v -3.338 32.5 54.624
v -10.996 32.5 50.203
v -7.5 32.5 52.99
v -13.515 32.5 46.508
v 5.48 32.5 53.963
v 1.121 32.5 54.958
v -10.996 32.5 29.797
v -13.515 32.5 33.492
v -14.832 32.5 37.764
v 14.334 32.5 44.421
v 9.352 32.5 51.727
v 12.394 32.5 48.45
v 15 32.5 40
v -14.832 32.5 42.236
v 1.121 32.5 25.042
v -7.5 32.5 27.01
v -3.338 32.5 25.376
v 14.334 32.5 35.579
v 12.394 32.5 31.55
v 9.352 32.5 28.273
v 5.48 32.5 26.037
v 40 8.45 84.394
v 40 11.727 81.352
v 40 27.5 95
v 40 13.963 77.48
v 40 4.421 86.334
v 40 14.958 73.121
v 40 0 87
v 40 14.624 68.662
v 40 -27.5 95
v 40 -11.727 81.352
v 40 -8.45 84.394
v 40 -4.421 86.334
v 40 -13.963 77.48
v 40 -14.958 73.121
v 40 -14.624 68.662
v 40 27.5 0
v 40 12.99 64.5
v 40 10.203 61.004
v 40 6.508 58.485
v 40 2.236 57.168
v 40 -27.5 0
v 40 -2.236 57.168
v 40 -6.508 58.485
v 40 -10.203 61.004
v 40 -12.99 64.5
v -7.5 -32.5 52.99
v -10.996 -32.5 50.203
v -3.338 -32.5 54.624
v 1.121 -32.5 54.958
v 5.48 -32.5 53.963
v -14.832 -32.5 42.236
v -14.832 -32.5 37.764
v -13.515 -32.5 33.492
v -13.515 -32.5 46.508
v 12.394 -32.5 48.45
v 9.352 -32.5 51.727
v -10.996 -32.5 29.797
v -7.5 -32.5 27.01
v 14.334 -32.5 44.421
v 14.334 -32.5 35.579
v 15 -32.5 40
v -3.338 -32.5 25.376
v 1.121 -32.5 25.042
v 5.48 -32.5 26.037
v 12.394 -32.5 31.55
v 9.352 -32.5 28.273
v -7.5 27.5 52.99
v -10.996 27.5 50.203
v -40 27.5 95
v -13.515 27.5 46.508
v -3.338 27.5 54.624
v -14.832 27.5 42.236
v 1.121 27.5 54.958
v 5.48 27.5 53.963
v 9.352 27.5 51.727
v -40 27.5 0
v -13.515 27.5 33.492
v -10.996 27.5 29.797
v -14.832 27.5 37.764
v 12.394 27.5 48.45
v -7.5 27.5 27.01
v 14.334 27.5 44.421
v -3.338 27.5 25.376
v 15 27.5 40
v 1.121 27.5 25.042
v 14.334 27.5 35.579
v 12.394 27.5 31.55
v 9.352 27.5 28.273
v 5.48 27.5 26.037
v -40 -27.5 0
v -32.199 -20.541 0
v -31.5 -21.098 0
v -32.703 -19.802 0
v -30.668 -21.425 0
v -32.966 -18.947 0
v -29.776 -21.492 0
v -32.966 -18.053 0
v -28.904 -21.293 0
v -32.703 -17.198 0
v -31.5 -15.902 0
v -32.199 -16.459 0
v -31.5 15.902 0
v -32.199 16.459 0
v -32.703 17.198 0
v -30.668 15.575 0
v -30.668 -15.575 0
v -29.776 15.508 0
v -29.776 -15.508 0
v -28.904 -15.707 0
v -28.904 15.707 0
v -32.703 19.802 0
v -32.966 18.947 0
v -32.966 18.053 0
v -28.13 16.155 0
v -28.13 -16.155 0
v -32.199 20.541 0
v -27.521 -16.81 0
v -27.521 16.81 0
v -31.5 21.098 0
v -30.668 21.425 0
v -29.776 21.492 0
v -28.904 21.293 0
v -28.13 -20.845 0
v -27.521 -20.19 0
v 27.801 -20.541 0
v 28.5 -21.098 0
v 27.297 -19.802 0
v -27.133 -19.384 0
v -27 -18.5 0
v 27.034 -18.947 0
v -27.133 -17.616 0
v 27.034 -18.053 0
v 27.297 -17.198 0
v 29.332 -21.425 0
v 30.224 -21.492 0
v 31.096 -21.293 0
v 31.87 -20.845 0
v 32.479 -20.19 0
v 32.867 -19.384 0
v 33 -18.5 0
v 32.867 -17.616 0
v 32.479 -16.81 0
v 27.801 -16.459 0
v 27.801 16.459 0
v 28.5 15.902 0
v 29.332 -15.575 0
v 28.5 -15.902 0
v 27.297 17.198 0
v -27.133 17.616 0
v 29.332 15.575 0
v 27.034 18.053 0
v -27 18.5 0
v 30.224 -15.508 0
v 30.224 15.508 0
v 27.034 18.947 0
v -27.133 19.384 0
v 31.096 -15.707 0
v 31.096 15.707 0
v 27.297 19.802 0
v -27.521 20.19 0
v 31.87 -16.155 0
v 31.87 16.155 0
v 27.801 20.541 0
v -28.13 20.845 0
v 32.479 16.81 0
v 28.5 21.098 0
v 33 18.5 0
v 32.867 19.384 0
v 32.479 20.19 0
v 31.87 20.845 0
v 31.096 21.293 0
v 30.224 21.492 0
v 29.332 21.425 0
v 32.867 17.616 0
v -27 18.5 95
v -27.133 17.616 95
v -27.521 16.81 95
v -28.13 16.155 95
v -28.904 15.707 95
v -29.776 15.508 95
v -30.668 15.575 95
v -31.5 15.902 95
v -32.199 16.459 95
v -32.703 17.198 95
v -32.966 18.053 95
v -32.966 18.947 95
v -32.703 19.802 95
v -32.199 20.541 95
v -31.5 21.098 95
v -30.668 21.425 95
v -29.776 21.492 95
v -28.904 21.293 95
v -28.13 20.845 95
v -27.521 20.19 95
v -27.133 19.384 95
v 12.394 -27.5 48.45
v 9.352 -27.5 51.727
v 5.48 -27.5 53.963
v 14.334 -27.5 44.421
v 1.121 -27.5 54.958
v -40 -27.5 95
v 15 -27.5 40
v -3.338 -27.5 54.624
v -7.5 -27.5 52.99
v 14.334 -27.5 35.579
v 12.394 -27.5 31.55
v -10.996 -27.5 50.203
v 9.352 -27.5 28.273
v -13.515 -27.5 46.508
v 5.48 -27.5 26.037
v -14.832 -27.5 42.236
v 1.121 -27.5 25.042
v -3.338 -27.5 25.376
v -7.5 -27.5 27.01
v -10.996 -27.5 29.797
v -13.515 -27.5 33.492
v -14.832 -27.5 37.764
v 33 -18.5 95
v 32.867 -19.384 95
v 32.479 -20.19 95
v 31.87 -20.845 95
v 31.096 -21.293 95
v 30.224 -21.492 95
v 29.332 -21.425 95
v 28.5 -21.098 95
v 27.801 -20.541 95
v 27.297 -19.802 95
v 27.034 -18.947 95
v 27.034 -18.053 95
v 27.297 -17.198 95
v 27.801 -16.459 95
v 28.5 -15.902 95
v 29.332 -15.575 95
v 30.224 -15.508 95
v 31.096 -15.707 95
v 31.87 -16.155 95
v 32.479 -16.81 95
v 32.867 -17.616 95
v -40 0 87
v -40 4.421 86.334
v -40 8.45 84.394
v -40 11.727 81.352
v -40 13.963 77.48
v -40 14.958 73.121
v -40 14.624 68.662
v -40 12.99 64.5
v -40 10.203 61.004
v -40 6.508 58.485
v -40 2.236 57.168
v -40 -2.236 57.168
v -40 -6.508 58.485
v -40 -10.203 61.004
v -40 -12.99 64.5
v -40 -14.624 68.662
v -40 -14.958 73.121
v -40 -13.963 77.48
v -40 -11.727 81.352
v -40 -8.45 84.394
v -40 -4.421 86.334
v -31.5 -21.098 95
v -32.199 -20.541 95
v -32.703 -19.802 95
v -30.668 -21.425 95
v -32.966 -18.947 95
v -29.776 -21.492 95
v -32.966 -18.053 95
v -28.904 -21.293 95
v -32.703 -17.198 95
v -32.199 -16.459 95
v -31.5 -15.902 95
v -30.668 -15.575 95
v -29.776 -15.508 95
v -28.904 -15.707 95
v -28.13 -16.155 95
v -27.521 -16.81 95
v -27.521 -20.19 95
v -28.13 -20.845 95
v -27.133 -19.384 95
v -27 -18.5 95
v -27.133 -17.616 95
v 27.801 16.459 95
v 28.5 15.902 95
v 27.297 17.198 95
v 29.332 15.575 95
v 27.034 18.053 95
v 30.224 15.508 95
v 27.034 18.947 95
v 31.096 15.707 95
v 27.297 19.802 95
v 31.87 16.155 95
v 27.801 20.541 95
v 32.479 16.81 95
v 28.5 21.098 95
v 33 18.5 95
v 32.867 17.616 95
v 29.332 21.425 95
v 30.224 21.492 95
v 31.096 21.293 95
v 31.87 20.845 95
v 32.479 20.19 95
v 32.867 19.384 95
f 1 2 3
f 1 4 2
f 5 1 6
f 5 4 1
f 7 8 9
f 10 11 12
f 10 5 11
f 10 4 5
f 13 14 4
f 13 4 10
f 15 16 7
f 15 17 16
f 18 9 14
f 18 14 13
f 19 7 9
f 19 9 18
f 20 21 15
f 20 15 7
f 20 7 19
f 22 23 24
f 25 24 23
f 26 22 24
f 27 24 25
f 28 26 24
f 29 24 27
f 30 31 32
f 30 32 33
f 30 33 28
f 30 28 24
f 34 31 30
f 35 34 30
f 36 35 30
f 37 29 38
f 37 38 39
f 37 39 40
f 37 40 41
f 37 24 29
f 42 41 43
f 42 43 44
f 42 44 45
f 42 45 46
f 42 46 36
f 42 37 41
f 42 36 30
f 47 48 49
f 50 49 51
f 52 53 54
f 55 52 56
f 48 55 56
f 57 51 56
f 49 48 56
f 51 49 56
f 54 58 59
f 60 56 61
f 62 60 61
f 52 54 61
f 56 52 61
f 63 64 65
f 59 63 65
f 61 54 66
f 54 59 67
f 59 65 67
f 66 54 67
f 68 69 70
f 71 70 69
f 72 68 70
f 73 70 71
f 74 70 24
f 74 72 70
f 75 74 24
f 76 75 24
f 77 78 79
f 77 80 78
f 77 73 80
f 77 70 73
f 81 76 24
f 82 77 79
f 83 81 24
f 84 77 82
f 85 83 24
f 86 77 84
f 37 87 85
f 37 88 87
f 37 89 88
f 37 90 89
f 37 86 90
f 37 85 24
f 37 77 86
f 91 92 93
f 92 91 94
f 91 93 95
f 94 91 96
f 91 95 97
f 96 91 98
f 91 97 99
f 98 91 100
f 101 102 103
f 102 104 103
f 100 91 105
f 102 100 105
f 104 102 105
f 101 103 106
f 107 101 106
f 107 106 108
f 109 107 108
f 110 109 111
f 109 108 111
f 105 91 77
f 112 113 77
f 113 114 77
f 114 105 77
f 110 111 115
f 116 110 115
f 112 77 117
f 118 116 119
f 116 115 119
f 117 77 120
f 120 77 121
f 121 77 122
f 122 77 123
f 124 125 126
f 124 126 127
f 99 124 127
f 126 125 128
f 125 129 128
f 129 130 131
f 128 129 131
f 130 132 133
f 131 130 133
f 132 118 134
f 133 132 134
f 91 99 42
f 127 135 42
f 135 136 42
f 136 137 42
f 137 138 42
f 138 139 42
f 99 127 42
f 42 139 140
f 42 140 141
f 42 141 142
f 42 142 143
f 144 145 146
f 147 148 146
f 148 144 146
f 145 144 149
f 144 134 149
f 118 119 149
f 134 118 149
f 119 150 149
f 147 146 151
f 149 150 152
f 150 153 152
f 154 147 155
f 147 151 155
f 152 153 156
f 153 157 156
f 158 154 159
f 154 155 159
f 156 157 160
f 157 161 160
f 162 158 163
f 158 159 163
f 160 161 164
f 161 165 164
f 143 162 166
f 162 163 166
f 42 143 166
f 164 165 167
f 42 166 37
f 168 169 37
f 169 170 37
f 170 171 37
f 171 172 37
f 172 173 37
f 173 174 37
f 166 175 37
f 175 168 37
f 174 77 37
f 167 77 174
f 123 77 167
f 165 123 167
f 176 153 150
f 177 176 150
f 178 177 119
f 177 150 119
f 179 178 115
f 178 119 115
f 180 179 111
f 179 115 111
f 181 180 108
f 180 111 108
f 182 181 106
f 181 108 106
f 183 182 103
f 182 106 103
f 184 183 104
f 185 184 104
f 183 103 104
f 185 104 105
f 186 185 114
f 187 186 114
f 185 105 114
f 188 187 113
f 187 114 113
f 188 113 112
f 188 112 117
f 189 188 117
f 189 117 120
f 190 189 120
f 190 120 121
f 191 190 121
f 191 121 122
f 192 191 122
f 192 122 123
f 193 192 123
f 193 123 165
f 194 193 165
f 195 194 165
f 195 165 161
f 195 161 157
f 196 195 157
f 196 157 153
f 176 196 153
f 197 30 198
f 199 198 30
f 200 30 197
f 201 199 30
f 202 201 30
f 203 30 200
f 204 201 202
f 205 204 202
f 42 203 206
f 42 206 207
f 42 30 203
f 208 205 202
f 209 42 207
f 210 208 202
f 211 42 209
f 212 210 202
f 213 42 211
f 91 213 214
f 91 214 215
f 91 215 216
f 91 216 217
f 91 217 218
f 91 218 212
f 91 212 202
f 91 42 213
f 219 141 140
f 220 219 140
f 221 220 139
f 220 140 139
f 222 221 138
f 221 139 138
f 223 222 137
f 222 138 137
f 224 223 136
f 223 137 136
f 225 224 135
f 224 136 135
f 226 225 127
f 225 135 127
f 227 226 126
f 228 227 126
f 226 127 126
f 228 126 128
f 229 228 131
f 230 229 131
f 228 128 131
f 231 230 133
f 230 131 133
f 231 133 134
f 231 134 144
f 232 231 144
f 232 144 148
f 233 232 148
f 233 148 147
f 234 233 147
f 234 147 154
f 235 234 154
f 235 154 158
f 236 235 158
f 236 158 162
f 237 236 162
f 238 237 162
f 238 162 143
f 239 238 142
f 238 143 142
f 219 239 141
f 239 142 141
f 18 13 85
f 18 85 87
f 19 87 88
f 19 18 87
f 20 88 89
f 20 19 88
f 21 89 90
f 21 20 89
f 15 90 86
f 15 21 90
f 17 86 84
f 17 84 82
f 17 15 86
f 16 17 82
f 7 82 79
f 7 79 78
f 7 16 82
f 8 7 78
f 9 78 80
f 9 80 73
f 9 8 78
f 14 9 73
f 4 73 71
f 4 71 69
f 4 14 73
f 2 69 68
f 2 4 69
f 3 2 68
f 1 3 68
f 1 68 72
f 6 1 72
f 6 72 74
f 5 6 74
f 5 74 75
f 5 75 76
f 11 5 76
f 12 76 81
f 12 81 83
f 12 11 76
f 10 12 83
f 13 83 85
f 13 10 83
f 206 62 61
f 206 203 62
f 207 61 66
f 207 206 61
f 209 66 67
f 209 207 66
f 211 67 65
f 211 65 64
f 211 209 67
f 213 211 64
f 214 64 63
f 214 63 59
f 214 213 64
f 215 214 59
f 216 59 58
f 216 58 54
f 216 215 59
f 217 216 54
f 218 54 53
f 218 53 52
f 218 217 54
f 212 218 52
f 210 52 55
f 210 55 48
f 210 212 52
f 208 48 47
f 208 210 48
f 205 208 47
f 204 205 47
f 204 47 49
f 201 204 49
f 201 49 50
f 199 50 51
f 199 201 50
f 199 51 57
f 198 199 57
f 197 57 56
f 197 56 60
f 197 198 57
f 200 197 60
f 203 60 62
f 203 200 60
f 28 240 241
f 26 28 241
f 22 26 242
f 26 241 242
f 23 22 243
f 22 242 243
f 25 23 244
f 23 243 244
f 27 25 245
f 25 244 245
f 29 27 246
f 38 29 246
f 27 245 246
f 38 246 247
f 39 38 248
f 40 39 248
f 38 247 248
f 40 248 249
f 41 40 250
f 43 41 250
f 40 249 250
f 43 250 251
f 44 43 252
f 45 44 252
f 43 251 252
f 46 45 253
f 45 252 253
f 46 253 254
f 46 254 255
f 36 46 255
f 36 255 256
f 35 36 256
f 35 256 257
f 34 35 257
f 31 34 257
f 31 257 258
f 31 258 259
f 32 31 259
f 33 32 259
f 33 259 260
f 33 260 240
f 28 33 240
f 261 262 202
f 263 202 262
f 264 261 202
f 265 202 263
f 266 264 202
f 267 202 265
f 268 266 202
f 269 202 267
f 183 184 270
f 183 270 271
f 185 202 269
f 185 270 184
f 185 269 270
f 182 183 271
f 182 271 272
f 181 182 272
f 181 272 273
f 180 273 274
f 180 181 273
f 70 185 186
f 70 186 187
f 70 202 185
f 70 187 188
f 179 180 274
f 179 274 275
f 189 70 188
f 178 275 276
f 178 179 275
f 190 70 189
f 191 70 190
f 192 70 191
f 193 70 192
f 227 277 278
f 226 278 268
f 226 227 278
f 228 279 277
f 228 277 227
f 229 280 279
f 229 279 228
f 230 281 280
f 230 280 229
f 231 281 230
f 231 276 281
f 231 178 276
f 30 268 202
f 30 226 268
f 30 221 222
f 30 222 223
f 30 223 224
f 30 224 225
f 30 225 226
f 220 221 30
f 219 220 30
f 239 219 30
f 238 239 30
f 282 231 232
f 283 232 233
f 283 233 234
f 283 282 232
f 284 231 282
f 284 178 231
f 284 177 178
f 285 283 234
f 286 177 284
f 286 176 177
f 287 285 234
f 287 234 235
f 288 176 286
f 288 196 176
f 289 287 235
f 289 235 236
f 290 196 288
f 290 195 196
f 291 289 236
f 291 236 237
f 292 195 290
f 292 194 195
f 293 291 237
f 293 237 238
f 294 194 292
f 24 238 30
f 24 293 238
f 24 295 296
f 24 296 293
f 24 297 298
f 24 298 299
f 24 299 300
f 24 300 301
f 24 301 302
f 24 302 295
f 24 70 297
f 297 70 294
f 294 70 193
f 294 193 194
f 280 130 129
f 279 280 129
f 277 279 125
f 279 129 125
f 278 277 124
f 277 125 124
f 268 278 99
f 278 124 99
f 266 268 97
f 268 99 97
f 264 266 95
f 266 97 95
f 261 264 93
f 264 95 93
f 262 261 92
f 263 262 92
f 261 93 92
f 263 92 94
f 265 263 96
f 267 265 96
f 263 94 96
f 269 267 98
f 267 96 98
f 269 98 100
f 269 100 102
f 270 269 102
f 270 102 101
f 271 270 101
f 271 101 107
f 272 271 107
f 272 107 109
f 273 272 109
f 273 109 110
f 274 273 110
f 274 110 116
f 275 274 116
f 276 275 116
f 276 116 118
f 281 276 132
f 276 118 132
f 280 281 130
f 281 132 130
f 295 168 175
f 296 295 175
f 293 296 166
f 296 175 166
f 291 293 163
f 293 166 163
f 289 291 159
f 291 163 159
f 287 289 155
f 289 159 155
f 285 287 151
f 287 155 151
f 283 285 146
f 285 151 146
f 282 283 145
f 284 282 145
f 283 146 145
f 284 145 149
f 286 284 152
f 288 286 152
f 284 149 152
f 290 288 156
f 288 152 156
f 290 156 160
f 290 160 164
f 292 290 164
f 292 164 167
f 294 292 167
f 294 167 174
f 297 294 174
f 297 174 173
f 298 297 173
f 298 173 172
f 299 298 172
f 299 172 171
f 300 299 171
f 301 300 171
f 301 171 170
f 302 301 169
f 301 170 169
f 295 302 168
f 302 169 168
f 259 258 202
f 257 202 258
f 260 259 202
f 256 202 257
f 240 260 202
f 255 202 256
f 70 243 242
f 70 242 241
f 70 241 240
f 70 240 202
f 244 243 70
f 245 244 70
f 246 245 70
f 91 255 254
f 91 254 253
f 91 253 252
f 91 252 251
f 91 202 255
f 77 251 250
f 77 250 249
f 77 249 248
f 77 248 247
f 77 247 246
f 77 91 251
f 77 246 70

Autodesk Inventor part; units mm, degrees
ref_plane "YZ Plane" through (0, 0, 0) normal (1, 0, 0) x (0, 1, 0)
ref_plane "XZ Plane" through (0, 0, 0) normal (0, 1, 0) x (-1, 0, 0)
ref_plane "XY Plane" through (0, 0, 0) normal (0, 0, 1) x (1, 0, 0)
sketch "草圖1" plane through (0, 0, 0) normal (0, 0, 1) x (1, 0, 0)
  line L0 (-40, 27.5) -> (40, 27.5)
  line L1 (40, 27.5) -> (40, -27.5)
  line L2 (40, -27.5) -> (-40, -27.5)
  line L3 (-40, -27.5) -> (-40, 27.5)
  line L4 (-40, 27.5) -> (40, -27.5) construction
  line L5 (40, 27.5) -> (-40, -27.5) construction
  circle A0 centre (0, 0) radius 18.5
  circle A1 centre (0, -18.5) radius 30
  circle A2 centre (-30, -18.5) radius 3
  circle A3 centre (30, -18.5) radius 3
  circle A4 centre (0, 18.5) radius 30
  circle A5 centre (-30, 18.5) radius 3
  circle A6 centre (30, 18.5) radius 3
  dimension "d0" = 80
  dimension "d1" = 55
  dimension "d4" = 37
  dimension "d5" = 60
  dimension "d6" = 6
  dimension "d7" = 6
  dimension "d8" = 60
  dimension "d9" = 6
  dimension "d10" = 6
extrude "擠出1" add sketch "草圖1" along normal blind 95 contours L0 A4 A5 A1 A2 L2 L3 | L0 A4 A6 A1 A0 A5 | L0 L1 L2 A1 A3 A4 A6 | A1 A2 A4 A0 A3 L2 | A1 A0 A4 | A4 A0 A1 | A1 A0 A4 | A0 A1 | A4 A0
sketch "草圖2" plane through (-40, -27.5, 0) normal (-1, 0, 0) x (0, 0, 1)
  line L0 (95, 0) -> (95, 55) projected
  circle A0 centre (95, 0) radius 27.5
  circle A1 centre (95, 27.5) radius 23
  circle A2 centre (72, 27.5) radius 15
  point P0 (0, 27.5)
  dimension "d11" = 46
  dimension "d12" = 30
extrude "擠出2" cut sketch "草圖2" along normal through all both and the other way through all contours A2 A0 A1 | A1 A0 A2 | A0 A1 A2 | A0 A2 A1 picked at (73.0639, 14.4683) picked at (77.5879, 17.5315) picked at (79.9817, 30.5353) picked at (67.7059, 31.4722)
sketch "草圖3" plane through (-40, 27.5, 0) normal (0, 1, 0) x (1, 0, 0)
  circle A0 centre (40, 0) radius 40
  circle A1 centre (40, -40) radius 15
  dimension "d15" = 80
  dimension "d16" = 30
extrude "擠出3" add sketch "草圖3" along normal blind 5 and the other way blind 60 contours A1 A0 | A0 A1 picked at (35.277, -35.2849) picked at (34.8016, -43.9729)
properties part number "MotorPart1"
